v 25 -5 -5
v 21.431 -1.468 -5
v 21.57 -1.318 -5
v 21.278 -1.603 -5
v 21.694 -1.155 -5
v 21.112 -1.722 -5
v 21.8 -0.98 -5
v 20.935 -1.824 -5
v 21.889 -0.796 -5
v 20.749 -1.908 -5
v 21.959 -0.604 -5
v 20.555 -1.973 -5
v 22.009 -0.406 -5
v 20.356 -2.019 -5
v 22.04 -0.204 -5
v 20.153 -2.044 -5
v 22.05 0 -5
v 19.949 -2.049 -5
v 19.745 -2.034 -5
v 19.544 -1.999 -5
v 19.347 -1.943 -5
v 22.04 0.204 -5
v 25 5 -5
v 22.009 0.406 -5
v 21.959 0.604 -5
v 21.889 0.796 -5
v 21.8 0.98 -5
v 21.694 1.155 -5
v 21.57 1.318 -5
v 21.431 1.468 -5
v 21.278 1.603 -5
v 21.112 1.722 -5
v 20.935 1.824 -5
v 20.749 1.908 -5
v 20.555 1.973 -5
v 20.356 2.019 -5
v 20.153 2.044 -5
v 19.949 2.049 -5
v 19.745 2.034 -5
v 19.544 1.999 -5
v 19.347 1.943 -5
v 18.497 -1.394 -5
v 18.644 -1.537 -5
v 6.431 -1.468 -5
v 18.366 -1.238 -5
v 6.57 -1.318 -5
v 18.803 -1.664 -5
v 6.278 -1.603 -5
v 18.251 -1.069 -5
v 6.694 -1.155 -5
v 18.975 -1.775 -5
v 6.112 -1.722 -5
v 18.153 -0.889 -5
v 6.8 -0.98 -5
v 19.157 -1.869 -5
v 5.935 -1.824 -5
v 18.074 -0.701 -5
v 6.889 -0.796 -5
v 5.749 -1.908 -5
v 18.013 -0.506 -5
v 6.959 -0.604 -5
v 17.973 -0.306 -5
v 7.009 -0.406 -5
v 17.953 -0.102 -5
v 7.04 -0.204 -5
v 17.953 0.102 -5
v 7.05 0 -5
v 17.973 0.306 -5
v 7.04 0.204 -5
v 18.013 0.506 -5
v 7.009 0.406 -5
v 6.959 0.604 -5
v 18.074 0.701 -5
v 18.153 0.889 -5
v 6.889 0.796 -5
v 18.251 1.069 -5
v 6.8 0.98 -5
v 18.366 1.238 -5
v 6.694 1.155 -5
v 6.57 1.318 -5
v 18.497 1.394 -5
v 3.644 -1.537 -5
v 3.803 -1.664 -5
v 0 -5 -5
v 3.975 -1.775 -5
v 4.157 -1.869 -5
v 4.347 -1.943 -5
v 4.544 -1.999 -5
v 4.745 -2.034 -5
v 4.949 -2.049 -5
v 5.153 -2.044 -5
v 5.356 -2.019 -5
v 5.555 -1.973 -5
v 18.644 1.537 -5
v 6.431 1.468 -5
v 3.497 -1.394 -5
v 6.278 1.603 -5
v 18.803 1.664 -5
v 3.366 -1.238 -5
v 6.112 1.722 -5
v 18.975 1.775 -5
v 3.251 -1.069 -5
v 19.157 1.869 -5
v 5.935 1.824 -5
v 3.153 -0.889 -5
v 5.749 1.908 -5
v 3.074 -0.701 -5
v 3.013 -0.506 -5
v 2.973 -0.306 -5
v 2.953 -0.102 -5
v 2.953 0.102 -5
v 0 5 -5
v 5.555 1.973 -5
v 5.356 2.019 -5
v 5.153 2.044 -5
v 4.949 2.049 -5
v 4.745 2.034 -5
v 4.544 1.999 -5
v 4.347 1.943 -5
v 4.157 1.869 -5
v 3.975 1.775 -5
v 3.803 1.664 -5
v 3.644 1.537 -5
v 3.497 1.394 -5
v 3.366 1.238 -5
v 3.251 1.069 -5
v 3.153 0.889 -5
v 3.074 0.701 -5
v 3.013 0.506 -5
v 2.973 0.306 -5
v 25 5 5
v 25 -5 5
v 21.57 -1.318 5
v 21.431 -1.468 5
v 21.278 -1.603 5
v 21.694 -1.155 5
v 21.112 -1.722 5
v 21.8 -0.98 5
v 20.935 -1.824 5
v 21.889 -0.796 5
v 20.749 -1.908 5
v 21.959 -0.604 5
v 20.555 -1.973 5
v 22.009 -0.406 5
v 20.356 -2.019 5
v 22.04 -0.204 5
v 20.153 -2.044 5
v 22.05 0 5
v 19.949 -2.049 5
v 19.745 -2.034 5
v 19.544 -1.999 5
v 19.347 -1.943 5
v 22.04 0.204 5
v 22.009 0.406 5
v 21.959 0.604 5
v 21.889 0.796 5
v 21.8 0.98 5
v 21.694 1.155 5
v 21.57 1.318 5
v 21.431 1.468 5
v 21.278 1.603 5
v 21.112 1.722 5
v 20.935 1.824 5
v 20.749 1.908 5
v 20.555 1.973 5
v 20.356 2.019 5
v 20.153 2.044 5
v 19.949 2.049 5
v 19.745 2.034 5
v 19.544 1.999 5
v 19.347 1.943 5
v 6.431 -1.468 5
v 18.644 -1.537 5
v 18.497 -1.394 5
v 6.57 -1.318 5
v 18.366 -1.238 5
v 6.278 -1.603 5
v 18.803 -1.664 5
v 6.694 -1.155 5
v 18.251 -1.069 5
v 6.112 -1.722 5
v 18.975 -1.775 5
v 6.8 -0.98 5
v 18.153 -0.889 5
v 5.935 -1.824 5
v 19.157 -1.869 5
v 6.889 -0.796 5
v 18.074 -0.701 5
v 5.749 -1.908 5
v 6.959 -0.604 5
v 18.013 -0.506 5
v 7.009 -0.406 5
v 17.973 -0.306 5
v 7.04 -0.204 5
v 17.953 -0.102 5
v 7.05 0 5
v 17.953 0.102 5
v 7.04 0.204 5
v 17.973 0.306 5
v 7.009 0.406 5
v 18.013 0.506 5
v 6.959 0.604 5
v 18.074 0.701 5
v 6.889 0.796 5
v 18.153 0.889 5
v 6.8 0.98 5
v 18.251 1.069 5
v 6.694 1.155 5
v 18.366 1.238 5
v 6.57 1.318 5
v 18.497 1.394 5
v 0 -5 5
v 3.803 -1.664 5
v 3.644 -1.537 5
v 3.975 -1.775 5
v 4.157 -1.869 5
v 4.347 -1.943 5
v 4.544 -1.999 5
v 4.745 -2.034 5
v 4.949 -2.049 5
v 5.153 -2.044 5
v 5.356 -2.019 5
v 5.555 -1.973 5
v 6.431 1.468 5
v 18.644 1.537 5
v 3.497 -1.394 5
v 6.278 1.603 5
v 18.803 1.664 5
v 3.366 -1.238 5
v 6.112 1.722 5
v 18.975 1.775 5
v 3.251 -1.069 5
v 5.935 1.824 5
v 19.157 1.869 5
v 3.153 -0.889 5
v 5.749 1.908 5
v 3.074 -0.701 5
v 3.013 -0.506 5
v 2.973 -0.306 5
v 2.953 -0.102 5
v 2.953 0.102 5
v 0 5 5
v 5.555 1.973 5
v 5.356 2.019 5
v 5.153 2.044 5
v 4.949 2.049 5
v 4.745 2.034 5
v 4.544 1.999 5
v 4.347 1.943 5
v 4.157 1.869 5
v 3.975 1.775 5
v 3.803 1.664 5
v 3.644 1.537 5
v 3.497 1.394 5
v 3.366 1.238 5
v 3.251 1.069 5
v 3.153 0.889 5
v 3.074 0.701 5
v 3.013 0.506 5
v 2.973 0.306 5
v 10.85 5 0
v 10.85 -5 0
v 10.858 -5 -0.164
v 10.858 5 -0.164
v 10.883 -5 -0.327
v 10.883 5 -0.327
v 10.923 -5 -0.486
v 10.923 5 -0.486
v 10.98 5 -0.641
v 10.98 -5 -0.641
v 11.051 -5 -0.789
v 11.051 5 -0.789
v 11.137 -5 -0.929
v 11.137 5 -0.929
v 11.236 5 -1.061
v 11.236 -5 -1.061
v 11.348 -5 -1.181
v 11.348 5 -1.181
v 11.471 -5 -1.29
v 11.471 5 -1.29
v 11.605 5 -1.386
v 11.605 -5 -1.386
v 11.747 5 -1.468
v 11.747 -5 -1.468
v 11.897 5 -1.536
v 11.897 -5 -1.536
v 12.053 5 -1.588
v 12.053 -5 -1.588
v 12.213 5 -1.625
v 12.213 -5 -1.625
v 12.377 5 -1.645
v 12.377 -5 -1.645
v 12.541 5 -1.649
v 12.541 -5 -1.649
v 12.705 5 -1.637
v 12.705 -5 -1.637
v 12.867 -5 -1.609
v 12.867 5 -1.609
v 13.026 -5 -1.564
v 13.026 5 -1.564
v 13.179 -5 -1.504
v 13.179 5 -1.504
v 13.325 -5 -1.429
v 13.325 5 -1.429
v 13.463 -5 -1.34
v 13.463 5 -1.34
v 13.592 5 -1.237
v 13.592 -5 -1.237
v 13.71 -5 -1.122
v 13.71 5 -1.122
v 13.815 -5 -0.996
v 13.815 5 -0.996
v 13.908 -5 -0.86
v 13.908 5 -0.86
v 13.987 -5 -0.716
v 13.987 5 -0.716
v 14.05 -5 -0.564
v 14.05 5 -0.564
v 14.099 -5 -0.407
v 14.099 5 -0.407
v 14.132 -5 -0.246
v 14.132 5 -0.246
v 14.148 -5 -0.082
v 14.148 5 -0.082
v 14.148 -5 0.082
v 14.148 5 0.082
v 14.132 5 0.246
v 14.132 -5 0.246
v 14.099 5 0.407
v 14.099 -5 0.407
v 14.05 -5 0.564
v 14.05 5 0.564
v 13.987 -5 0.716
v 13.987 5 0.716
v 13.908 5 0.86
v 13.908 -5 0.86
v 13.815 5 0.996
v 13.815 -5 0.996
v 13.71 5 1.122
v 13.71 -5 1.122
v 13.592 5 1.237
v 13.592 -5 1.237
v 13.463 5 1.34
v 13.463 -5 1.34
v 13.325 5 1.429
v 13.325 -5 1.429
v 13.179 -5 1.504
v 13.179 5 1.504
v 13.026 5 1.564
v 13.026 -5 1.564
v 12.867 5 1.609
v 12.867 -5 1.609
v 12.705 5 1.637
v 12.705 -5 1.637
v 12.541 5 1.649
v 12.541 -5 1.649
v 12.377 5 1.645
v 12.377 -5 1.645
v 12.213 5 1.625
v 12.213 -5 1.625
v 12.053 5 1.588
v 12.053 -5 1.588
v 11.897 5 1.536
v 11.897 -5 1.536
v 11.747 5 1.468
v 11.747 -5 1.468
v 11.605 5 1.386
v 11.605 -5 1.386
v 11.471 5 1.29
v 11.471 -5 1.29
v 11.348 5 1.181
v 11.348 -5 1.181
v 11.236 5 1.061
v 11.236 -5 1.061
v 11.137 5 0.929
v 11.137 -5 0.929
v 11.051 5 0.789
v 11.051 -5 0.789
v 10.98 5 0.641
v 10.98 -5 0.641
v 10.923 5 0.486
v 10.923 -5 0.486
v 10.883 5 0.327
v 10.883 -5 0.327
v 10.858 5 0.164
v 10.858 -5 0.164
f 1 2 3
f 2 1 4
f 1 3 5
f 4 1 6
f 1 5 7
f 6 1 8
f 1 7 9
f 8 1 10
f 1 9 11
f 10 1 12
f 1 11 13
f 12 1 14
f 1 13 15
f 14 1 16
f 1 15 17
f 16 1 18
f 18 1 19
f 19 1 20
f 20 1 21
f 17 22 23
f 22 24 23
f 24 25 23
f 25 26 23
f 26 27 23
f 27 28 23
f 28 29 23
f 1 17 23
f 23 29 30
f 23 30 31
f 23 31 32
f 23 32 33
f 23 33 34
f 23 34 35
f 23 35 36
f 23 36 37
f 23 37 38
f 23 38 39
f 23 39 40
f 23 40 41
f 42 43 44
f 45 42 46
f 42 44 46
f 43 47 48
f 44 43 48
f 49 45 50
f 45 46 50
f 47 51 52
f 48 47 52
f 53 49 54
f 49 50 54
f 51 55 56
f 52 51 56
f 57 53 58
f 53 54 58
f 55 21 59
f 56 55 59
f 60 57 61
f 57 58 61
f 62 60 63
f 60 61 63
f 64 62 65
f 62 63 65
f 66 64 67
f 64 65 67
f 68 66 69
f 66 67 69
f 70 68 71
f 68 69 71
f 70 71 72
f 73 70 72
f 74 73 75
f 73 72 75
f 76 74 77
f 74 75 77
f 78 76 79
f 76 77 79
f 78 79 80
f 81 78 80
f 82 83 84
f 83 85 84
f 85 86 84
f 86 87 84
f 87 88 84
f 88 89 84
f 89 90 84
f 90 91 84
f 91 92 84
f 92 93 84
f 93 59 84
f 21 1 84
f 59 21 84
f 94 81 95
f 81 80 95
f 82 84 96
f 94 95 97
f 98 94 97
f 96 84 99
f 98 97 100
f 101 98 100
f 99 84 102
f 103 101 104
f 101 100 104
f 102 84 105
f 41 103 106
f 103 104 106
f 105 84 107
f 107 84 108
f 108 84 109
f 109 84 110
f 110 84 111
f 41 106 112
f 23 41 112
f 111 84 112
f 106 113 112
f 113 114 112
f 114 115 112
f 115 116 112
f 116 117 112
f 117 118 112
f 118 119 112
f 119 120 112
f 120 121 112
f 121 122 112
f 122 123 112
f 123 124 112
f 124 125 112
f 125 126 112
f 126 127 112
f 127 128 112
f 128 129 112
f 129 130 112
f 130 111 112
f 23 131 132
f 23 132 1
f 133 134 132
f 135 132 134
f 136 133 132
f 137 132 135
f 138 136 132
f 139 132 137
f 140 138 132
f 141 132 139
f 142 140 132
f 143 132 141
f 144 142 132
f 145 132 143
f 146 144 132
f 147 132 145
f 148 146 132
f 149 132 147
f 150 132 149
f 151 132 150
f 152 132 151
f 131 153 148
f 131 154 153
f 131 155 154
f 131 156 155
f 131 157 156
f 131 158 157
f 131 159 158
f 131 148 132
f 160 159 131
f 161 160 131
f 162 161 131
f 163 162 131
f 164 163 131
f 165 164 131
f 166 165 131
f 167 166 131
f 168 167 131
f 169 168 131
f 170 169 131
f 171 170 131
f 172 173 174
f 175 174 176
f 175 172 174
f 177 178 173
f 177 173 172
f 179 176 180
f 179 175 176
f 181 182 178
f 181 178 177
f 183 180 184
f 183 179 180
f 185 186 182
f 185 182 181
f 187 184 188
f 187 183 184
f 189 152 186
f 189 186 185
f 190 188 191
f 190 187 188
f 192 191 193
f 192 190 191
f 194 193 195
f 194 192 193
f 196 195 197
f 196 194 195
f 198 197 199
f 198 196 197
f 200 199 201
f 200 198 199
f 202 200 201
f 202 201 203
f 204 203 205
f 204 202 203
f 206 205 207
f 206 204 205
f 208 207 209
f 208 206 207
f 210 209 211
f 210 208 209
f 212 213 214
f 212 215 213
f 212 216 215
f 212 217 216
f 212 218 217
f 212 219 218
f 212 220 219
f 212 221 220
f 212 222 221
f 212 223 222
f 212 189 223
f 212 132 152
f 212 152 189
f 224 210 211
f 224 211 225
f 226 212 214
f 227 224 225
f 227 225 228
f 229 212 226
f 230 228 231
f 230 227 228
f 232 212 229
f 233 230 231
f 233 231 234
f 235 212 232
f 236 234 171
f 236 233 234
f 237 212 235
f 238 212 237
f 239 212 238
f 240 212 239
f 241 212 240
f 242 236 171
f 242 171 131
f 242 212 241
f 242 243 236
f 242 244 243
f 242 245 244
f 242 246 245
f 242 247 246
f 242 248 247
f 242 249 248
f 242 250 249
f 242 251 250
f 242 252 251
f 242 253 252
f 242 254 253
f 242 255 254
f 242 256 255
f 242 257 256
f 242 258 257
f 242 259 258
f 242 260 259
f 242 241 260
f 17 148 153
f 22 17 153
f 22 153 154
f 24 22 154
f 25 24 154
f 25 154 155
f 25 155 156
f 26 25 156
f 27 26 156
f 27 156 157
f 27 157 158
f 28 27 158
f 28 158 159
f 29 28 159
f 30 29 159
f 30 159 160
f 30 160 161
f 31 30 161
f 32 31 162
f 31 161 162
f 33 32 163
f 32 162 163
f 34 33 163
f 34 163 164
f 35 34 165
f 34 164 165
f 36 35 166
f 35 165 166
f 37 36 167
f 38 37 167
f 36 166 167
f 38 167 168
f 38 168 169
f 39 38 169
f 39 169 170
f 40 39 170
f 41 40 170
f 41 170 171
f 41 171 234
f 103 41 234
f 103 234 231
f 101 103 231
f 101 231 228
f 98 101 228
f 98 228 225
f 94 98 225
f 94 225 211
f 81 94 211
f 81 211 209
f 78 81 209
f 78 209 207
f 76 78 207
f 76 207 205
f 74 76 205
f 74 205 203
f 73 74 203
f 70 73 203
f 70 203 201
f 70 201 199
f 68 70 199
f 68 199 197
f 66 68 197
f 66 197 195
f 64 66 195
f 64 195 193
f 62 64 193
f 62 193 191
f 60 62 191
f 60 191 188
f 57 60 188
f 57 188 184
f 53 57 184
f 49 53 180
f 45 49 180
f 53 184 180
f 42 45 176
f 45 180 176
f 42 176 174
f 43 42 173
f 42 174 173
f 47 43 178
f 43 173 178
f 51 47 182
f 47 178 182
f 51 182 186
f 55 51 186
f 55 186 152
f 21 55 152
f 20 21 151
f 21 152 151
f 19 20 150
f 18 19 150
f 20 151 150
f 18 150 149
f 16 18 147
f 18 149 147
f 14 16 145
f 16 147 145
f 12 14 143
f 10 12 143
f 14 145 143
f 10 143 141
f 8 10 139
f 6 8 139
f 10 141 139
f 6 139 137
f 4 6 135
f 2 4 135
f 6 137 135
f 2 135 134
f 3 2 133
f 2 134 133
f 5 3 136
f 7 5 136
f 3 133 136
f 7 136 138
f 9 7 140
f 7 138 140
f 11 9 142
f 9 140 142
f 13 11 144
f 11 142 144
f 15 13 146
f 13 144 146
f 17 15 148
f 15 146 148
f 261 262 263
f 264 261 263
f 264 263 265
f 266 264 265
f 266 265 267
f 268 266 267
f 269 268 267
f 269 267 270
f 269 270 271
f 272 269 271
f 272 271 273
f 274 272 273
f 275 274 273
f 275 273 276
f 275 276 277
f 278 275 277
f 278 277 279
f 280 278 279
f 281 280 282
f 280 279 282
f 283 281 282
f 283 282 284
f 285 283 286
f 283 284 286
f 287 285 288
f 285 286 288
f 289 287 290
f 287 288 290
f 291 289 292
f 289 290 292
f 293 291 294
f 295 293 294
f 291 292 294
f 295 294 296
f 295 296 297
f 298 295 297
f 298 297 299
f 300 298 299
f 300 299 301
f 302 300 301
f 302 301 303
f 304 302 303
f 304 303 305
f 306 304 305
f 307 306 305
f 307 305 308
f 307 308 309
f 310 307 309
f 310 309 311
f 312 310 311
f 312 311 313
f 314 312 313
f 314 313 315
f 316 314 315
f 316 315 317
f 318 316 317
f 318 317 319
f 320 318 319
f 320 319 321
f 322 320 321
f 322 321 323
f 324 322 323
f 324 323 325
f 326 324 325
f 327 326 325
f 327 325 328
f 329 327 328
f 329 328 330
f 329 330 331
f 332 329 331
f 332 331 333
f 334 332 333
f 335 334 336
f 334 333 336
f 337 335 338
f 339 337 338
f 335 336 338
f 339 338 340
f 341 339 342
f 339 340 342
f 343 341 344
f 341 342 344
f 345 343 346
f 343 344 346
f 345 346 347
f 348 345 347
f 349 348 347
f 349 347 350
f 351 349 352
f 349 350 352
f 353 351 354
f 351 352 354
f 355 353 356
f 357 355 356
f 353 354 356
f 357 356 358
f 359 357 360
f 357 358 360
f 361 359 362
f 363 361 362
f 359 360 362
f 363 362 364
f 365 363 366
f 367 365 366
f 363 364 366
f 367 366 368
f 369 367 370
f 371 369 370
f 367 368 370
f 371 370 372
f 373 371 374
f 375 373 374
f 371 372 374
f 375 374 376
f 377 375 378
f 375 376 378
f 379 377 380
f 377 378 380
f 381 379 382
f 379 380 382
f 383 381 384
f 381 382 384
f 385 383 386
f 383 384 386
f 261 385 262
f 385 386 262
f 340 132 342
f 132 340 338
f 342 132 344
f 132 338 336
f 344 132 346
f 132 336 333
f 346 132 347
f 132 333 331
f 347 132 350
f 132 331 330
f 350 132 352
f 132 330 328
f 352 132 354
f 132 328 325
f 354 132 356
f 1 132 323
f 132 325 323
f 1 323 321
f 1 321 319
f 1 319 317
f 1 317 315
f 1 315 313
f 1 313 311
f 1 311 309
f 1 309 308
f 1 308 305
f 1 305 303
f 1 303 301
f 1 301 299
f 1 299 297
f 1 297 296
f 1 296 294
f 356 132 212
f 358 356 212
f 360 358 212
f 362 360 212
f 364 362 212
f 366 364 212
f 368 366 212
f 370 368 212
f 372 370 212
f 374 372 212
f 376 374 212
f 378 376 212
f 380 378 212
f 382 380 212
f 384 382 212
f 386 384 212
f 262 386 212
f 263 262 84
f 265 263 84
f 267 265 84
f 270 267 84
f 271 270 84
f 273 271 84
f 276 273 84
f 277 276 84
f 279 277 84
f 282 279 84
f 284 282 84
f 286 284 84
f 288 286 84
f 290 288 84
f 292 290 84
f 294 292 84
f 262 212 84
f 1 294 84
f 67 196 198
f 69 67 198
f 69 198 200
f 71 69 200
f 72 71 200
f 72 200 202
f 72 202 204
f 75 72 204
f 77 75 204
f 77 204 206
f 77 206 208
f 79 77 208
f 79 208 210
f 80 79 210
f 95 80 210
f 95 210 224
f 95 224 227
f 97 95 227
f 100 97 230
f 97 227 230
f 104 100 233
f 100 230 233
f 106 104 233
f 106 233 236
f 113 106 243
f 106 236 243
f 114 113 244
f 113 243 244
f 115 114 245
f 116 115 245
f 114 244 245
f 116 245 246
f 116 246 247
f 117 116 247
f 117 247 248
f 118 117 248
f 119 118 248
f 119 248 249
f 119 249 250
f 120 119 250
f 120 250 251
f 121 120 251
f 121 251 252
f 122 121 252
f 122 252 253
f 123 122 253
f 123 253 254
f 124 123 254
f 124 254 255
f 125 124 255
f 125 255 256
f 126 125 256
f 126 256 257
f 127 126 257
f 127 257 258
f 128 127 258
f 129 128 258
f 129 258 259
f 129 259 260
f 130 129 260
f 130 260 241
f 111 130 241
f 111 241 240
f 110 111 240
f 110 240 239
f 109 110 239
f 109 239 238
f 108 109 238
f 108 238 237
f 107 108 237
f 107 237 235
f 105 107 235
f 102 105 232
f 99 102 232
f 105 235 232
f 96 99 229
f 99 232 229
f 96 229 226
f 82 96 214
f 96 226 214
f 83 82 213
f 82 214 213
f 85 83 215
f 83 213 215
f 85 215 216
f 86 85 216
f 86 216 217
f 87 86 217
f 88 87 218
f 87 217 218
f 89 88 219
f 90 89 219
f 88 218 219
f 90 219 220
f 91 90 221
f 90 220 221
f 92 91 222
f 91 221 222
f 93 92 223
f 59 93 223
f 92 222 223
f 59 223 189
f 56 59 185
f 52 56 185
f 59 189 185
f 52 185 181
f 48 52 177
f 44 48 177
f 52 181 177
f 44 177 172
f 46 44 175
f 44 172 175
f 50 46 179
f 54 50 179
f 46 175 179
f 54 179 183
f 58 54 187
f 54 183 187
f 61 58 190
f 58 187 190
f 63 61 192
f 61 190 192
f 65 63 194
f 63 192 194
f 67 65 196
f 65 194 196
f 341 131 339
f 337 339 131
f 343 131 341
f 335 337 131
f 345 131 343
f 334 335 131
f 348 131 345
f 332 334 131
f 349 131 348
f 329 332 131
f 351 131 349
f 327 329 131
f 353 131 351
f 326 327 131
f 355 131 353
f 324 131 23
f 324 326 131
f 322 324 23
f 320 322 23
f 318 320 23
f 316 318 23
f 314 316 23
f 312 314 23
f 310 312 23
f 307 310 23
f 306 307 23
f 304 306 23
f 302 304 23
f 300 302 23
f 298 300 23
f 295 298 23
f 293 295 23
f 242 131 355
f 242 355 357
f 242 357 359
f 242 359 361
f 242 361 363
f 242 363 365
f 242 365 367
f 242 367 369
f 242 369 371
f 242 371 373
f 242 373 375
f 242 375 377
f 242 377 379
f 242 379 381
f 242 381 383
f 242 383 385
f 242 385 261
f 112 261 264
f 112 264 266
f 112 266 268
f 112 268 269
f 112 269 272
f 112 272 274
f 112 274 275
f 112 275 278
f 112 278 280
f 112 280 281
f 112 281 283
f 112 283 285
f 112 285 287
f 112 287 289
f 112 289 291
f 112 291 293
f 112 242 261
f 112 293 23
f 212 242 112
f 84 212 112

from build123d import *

# Parameters (mm, degrees)
SKETCH_1_W             = 10
SKETCH_1_H             = 10
EXTRUDE_1_DEPTH        = 25
SKETCH_2_R             = 1.5
CUT_EXTRUDE_1_DEPTH    = 28.386127875
SKETCH_3_R             = 2.05
CUT_EXTRUDE_2_DEPTH    = 28.386127875
HOLE_WIZARD_M4_2_D     = 3.3
HOLE_WIZARD_M4_2_DEPTH = 10.1
HOLE_WIZARD_M4_2_TIP   = 0.991420021


with BuildPart() as part:
    # 草图1 → 凸台-拉伸1 (new body)
    with BuildSketch(Plane(origin=(0, 0, 0), x_dir=(0, 0, -1), z_dir=(1, 0, 0))):
        Rectangle(SKETCH_1_W, SKETCH_1_H)
    extrude(amount=EXTRUDE_1_DEPTH)

    # 草图2 → 切除-拉伸1 (cut, through all)
    with BuildSketch(Plane(origin=(0, 5, 0), x_dir=(1, 0, 0), z_dir=(0, 1, 0))):
        with Locations(Location((12.5, 0, 0), (0, 0, 270))):
            Circle(SKETCH_2_R)
    extrude(amount=-CUT_EXTRUDE_1_DEPTH, mode=Mode.SUBTRACT)

    # 草图3 → 切除-拉伸2 (cut, through all)
    with BuildSketch(Plane.XY.offset(5)):
        with Locations((5, 0)):
            Circle(SKETCH_3_R)
        with Locations((20, 0)):
            Circle(SKETCH_3_R)
    extrude(amount=-CUT_EXTRUDE_2_DEPTH, mode=Mode.SUBTRACT)

    # M4 螺纹孔2
    with Locations(Plane(origin=(0, 5, 0), x_dir=(1, 0, 0), z_dir=(0, 1, 0))):
        with Locations((12.5, 0)):
            Hole(HOLE_WIZARD_M4_2_D / 2, depth=HOLE_WIZARD_M4_2_DEPTH)
            with Locations((0, 0, -(HOLE_WIZARD_M4_2_DEPTH + HOLE_WIZARD_M4_2_TIP / 2))):  # 118° drill point
                Cone(0, HOLE_WIZARD_M4_2_D / 2, HOLE_WIZARD_M4_2_TIP, mode=Mode.SUBTRACT)


solid = part.part
